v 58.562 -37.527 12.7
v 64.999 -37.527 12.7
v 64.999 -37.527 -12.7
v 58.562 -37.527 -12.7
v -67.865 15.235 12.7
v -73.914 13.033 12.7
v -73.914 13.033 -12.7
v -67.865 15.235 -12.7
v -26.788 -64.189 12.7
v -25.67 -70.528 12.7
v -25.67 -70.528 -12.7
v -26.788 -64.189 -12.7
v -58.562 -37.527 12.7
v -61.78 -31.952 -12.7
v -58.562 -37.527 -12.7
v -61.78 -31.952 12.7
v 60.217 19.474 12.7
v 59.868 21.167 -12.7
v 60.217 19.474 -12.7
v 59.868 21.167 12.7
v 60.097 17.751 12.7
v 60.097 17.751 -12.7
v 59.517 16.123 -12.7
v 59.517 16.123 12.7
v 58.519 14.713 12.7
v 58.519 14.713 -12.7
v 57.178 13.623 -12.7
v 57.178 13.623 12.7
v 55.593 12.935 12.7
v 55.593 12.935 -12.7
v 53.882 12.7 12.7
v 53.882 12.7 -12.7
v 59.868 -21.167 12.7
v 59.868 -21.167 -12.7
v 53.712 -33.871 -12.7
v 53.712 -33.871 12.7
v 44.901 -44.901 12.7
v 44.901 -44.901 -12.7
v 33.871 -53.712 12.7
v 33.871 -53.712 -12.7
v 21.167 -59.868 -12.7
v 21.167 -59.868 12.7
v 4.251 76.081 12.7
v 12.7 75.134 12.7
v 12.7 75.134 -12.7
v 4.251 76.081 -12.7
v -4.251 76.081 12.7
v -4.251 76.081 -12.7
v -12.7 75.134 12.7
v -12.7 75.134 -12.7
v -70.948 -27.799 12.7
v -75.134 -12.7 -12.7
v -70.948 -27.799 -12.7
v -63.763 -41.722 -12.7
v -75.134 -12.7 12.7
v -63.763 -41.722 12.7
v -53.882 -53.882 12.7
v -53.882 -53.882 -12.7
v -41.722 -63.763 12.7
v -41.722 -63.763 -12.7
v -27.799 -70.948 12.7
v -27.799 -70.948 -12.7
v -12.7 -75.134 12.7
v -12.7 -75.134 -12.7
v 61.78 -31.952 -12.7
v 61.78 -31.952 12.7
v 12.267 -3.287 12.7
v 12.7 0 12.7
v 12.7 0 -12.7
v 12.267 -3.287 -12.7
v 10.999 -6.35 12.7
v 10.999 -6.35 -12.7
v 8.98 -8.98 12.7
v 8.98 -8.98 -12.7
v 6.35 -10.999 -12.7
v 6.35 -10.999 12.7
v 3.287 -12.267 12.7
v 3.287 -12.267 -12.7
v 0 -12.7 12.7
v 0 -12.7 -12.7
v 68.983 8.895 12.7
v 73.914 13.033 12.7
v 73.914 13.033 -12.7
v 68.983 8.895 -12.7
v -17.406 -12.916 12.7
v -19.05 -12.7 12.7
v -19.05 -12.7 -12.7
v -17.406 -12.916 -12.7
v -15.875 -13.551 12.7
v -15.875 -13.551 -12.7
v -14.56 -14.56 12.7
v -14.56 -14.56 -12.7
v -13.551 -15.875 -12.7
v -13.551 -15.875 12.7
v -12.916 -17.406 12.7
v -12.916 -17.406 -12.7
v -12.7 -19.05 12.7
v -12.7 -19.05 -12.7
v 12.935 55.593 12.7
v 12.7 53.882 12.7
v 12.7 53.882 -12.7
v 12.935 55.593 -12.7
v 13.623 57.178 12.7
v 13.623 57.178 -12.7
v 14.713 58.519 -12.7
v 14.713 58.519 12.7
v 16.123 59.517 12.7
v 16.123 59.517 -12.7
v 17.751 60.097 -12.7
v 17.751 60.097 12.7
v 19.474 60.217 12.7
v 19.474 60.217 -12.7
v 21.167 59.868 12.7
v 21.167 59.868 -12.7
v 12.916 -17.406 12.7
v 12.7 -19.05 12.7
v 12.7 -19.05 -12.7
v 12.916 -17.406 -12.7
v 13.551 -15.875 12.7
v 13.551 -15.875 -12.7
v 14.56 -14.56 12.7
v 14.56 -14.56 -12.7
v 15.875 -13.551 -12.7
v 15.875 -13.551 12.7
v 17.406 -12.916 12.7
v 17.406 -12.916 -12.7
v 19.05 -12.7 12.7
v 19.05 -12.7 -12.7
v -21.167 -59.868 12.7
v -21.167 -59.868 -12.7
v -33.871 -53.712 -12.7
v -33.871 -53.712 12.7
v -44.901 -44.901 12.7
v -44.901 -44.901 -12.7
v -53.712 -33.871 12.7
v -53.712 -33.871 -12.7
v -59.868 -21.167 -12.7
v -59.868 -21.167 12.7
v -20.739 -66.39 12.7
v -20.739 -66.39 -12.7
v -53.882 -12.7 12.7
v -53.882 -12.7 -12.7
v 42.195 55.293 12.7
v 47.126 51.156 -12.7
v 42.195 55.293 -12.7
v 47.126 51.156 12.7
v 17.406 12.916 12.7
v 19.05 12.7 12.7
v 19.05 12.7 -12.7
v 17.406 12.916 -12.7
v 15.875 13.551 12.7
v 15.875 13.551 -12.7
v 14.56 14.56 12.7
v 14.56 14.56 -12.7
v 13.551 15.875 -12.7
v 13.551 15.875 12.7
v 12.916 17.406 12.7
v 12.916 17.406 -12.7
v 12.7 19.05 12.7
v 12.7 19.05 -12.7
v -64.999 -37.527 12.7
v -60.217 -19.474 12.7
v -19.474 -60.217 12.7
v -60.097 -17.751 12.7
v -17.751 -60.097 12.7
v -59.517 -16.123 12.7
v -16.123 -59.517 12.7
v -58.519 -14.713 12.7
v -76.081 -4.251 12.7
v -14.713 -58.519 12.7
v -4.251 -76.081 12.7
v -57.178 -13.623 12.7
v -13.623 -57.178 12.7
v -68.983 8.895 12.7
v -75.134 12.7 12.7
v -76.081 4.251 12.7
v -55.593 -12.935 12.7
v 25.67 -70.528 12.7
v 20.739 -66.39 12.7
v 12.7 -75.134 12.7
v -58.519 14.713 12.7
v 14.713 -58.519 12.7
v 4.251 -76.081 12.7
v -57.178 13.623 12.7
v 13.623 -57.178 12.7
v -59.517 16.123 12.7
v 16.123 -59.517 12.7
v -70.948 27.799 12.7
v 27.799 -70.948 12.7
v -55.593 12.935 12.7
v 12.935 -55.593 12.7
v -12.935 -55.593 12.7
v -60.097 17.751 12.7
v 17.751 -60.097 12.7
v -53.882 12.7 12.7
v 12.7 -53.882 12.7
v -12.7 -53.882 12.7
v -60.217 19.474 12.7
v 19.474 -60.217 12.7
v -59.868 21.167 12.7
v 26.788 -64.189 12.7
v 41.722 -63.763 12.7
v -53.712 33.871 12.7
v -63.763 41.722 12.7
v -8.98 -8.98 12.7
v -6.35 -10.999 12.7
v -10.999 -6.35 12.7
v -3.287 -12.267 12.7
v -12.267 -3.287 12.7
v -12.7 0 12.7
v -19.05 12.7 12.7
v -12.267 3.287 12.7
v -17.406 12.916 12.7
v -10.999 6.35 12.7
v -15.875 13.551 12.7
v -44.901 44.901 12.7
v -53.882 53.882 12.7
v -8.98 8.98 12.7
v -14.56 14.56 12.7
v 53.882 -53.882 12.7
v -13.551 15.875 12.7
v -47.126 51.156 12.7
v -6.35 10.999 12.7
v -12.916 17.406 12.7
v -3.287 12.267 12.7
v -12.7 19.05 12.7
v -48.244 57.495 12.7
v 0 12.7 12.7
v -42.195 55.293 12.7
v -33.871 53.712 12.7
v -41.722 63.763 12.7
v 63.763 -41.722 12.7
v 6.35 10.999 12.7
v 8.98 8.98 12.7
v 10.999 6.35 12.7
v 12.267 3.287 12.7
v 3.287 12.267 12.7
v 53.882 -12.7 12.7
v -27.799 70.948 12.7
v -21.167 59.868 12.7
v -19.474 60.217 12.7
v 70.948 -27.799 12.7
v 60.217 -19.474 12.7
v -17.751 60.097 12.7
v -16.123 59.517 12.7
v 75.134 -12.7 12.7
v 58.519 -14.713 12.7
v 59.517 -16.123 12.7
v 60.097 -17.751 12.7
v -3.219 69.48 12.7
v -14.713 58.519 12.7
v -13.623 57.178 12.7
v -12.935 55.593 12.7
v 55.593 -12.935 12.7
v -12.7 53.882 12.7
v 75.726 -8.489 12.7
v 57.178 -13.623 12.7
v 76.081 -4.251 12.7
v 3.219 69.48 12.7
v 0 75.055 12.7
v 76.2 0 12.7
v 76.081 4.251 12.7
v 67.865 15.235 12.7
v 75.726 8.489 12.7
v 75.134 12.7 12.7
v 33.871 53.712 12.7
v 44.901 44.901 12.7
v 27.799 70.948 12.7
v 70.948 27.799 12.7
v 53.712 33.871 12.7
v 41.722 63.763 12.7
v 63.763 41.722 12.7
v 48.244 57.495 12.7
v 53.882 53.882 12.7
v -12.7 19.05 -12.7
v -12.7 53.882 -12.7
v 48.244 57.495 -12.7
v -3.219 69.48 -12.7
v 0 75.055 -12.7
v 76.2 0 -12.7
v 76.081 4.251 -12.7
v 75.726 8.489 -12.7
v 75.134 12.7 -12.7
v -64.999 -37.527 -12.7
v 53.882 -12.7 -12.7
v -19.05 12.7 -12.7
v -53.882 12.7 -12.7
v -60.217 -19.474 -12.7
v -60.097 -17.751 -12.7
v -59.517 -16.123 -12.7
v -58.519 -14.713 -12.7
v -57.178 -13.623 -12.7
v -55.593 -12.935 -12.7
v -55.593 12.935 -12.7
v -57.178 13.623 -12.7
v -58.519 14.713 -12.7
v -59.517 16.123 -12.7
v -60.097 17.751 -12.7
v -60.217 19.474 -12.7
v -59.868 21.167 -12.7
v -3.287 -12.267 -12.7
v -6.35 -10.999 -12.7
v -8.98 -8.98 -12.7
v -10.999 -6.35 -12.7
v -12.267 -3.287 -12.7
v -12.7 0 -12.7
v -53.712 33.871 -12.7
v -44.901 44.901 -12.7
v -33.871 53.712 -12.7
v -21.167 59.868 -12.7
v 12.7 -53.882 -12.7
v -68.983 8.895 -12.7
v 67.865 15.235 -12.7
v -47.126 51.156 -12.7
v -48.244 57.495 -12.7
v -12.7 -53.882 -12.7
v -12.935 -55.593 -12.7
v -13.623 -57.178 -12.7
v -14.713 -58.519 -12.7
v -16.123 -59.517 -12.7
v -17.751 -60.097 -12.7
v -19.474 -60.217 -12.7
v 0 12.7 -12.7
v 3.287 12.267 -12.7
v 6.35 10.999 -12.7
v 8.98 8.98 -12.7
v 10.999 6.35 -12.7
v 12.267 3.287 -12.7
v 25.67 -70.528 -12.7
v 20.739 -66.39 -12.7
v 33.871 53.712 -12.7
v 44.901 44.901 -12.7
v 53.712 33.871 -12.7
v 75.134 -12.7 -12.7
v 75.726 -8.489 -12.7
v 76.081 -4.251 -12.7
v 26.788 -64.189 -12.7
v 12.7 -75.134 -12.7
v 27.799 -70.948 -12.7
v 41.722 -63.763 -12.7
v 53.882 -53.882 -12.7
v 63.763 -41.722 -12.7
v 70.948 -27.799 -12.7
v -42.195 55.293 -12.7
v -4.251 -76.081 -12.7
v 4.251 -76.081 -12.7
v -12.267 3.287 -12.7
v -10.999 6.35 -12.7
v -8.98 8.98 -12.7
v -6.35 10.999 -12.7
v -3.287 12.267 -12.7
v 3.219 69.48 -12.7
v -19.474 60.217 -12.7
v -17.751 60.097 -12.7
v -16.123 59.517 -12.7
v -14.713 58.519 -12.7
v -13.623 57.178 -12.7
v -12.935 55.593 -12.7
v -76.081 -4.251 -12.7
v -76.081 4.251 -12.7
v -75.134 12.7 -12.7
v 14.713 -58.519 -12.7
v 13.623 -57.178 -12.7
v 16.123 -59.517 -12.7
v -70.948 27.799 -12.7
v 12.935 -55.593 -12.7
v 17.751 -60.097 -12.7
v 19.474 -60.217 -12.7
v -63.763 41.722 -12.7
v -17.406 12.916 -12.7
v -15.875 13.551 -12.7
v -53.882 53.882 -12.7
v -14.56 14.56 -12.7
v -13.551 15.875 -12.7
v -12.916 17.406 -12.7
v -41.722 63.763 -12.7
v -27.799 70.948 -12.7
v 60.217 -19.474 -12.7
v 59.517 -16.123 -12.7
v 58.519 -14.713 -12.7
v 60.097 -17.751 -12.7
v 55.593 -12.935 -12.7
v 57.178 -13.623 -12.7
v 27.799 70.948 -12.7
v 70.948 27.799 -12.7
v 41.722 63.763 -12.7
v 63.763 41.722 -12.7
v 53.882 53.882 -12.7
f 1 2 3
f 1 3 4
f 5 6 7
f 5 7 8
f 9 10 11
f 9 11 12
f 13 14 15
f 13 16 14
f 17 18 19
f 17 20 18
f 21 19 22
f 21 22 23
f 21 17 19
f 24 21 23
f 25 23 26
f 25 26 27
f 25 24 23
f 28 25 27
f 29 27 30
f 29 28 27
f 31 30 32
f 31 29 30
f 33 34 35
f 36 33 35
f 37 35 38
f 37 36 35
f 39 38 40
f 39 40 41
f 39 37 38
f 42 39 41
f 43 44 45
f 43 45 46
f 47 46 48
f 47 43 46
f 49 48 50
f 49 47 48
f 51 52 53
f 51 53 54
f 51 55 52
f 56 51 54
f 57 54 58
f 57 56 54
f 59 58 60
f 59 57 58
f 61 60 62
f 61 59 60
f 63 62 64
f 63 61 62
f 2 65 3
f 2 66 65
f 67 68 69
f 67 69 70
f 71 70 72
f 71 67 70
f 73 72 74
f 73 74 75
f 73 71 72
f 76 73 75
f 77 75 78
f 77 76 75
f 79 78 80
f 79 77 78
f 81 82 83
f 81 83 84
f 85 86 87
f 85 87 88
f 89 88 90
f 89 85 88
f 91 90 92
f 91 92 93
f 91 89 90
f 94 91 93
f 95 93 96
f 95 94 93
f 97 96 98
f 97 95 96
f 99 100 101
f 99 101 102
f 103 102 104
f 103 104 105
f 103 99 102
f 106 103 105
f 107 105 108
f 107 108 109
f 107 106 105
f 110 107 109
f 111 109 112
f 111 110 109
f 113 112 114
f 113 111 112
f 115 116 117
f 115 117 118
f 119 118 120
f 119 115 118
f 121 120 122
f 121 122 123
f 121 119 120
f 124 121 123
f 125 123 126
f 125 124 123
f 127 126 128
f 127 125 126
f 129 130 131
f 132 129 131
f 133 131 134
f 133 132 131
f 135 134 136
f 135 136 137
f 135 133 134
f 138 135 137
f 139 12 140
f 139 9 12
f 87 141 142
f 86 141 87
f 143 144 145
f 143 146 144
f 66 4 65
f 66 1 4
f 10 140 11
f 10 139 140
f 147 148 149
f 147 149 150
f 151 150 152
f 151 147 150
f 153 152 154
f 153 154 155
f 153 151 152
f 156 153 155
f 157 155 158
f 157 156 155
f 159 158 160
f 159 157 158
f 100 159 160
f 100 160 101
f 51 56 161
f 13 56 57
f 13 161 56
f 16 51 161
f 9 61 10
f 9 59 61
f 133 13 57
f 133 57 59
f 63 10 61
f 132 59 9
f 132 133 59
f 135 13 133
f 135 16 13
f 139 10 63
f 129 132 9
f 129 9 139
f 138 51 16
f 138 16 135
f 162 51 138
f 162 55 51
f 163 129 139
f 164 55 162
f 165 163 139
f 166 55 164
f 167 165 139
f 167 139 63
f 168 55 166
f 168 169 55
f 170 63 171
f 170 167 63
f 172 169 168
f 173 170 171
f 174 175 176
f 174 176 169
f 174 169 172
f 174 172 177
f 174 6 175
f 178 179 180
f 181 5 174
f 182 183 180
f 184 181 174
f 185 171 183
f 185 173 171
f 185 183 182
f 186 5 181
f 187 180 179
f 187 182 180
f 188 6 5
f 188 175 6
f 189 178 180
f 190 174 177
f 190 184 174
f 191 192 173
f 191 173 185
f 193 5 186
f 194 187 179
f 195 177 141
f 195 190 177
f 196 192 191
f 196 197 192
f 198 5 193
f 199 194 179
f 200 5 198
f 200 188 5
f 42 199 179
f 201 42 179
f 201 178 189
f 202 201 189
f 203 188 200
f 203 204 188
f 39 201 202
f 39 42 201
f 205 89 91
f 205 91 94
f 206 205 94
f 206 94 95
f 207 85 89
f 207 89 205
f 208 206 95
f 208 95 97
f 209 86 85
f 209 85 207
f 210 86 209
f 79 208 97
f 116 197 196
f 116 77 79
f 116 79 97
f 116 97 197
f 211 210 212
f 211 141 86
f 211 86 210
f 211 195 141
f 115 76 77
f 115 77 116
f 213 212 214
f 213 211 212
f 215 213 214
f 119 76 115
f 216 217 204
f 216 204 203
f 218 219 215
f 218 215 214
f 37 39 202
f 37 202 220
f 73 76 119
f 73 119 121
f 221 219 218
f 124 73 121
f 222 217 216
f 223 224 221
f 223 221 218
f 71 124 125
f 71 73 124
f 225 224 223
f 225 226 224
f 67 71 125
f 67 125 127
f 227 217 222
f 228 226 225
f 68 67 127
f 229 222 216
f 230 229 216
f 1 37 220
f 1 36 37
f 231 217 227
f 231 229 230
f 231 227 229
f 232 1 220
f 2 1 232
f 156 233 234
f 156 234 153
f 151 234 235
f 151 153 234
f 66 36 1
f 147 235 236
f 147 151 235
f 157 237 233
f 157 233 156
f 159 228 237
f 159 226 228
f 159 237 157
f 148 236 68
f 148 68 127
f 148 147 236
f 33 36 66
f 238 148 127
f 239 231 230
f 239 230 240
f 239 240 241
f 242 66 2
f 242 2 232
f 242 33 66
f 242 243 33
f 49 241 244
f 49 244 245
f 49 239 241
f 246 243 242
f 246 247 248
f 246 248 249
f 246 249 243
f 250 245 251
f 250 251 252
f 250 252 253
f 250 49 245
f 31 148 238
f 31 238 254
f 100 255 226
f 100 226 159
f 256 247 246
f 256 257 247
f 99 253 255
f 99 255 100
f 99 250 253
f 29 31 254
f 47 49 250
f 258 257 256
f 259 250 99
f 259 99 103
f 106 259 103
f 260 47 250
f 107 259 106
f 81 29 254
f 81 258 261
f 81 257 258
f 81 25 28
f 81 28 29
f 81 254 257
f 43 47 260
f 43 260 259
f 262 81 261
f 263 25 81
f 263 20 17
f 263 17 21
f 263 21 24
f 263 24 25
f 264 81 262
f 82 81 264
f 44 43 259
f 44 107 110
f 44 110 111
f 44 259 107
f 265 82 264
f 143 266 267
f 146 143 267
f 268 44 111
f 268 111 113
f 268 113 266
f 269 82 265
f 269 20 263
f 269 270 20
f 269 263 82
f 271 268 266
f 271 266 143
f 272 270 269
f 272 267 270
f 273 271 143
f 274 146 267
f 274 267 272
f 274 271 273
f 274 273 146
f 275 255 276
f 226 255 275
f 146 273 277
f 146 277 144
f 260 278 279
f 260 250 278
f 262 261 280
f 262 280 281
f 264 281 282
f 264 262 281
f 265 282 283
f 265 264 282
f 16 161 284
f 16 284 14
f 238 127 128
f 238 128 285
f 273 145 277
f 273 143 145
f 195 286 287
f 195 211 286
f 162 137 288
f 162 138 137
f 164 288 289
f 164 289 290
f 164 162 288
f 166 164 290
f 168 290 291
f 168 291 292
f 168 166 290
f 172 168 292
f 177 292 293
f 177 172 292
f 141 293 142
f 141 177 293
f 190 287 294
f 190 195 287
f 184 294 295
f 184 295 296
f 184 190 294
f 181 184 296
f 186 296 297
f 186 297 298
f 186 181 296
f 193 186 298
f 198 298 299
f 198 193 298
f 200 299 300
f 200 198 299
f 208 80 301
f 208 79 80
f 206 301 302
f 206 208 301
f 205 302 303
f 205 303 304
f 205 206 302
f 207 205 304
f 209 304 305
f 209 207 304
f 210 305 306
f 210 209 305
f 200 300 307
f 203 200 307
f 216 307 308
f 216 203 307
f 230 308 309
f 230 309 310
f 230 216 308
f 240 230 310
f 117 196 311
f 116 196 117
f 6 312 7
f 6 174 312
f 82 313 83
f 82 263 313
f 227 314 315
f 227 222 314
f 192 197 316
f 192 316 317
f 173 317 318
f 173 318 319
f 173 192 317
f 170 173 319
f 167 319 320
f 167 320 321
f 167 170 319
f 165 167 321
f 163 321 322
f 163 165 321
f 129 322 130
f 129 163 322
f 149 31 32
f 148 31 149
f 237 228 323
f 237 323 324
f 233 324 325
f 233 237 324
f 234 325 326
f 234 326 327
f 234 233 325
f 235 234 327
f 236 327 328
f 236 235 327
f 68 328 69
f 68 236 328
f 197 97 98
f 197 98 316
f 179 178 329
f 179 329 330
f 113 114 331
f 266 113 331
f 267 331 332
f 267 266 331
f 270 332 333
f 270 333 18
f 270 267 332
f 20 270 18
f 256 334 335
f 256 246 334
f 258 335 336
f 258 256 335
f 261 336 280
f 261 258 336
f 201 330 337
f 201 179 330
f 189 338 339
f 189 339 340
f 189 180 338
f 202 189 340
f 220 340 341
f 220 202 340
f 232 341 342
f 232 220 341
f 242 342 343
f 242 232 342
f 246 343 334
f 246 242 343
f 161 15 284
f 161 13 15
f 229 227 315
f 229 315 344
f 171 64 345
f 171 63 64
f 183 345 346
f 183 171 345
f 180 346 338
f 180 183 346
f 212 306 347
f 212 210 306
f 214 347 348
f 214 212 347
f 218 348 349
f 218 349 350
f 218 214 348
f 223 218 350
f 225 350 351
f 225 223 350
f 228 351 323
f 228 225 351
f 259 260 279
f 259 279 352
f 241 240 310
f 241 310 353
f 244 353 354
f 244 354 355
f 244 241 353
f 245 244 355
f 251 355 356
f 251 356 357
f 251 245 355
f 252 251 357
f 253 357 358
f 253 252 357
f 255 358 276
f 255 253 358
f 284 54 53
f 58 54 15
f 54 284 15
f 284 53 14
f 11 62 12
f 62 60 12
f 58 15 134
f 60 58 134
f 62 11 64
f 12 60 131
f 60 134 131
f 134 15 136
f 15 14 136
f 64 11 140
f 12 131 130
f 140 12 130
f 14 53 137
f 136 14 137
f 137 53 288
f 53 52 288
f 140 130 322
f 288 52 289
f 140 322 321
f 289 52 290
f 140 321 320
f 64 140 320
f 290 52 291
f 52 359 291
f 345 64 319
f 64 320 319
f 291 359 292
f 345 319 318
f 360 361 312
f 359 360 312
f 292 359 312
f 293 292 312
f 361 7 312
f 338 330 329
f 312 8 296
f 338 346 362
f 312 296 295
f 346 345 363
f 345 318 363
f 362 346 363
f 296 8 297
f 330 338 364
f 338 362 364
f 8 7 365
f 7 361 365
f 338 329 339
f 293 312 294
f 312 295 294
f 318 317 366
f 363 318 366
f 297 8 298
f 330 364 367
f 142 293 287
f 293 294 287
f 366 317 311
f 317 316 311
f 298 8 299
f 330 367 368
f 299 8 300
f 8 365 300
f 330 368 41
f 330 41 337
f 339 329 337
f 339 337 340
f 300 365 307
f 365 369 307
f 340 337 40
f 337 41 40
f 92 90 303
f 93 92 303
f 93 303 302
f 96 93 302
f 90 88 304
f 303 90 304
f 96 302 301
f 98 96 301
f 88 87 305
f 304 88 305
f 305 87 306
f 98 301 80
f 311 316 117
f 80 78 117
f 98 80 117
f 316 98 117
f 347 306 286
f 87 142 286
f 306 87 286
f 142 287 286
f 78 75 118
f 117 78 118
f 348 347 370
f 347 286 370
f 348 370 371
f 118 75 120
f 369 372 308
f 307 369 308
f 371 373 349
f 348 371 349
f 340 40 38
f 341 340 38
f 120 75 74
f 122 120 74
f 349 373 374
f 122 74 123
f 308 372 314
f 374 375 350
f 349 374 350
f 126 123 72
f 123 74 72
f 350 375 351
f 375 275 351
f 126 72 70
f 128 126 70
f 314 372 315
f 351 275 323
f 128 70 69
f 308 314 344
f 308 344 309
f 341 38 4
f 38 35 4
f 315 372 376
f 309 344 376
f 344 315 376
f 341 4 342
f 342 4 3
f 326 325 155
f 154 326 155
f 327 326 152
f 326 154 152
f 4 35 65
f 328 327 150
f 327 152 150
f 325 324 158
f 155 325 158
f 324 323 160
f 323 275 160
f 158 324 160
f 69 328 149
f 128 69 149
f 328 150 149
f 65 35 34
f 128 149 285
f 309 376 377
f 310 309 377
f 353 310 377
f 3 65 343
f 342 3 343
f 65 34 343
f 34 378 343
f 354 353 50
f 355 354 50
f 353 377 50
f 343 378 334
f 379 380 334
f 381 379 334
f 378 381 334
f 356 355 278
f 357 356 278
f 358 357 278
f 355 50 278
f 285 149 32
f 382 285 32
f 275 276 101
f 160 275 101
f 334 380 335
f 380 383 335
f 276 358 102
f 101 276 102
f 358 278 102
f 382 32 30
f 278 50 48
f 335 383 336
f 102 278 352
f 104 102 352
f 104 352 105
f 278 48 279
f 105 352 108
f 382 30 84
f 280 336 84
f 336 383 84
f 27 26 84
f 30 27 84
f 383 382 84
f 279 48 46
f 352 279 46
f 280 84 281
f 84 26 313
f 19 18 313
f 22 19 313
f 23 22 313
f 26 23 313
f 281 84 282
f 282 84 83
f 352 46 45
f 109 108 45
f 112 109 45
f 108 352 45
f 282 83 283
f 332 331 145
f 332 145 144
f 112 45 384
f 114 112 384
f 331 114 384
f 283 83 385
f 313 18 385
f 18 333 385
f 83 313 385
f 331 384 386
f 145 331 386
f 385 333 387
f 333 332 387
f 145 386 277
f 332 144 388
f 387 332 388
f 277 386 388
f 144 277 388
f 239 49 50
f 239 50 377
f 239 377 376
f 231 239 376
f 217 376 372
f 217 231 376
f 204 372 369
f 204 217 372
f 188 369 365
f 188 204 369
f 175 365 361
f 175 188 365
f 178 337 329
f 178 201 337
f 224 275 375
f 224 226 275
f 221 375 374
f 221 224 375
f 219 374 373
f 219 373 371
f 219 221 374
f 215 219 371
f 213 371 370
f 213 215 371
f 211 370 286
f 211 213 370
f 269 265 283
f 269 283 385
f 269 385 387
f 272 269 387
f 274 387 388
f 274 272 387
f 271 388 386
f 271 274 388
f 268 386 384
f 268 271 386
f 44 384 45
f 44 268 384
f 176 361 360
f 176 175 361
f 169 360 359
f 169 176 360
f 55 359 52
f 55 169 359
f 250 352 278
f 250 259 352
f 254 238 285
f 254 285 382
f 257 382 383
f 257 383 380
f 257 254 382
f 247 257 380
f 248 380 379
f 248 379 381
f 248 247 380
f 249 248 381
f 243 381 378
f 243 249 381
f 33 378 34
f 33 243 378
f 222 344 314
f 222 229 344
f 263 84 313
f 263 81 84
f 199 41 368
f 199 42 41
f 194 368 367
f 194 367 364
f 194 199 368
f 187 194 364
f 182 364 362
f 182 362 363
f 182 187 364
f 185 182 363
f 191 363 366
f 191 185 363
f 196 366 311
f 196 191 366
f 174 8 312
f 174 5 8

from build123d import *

# Parameters (mm, degrees)
F1_DEPTH = 12.7


with BuildPart() as f1:
    # F0 (on Top) → F1 (new body, symmetric)
    with BuildSketch(Plane.XY):
        with BuildLine():
            ThreePointArc((75.134213, -12.7), (75.933086, -6.372321), (76.2, 0))
            ThreePointArc((76.2, 0), (75.933086, 6.372321), (75.134213, 12.7))
            ThreePointArc((75.134213, 12.7), (53.881537, 53.881537), (12.7, 75.134213))
            ThreePointArc((12.7, 75.134213), (0, 76.2), (-12.7, 75.134213))
            ThreePointArc((-12.7, 75.134213), (-53.881537, 53.881537), (-75.134213, 12.7))
            ThreePointArc((-75.134213, 12.7), (-76.2, 0), (-75.134213, -12.7))
            ThreePointArc((-75.134213, -12.7), (-53.881537, -53.881537), (-12.7, -75.134213))
            ThreePointArc((-12.7, -75.134213), (0, -76.2), (12.7, -75.134213))
            ThreePointArc((12.7, -75.134213), (53.881537, -53.881537), (75.134213, -12.7))
        make_face()
        Polygon((-25.670162, -70.528192), (-26.787991, -64.18867), (-20.73889, -66.390362), align=None, mode=Mode.SUBTRACT)
        Polygon((-64.999133, -37.527267), (-61.780473, -31.952385), (-58.561814, -37.527267), align=None, mode=Mode.SUBTRACT)
        with BuildLine():
            Line((-34.771706, -12.7), (-19.05, -12.7))
            ThreePointArc((-19.05, -12.7), (-14.559872, -14.559872), (-12.7, -19.05))
            Line((-12.7, -19.05), (-12.7, -34.771706))
            Line((-12.7, -34.771706), (-12.7, -45.838683))
            Line((-12.7, -45.838683), (-12.7, -53.881537))
            ThreePointArc((-12.7, -53.881537), (-15.383826, -59.06629), (-21.166667, -59.868374))
            ThreePointArc((-21.166667, -59.868374), (-44.901281, -44.901281), (-59.868374, -21.166667))
            ThreePointArc((-59.868374, -21.166667), (-59.06629, -15.383826), (-53.881537, -12.7))
            Line((-53.881537, -12.7), (-45.838683, -12.7))
            Line((-45.838683, -12.7), (-34.771706, -12.7))
        make_face(mode=Mode.SUBTRACT)
        Polygon((25.670162, -70.528192), (20.73889, -66.390362), (26.787991, -64.18867), align=None, mode=Mode.SUBTRACT)
        with BuildLine():
            ThreePointArc((12.7, -19.05), (14.559872, -14.559872), (19.05, -12.7))
            Line((19.05, -12.7), (34.771706, -12.7))
            Line((34.771706, -12.7), (45.838683, -12.7))
            Line((45.838683, -12.7), (53.881537, -12.7))
            ThreePointArc((53.881537, -12.7), (59.06629, -15.383826), (59.868374, -21.166667))
            ThreePointArc((59.868374, -21.166667), (44.901281, -44.901281), (21.166667, -59.868374))
            ThreePointArc((21.166667, -59.868374), (15.383826, -59.06629), (12.7, -53.881537))
            Line((12.7, -53.881537), (12.7, -45.838683))
            Line((12.7, -45.838683), (12.7, -34.771706))
            Line((12.7, -34.771706), (12.7, -19.05))
        make_face(mode=Mode.SUBTRACT)
        Polygon((64.999133, -37.527267), (58.561814, -37.527267), (61.780473, -31.952385), align=None, mode=Mode.SUBTRACT)
        Polygon((-73.914287, 13.033083), (-67.865185, 15.234776), (-68.983014, 8.895254), align=None, mode=Mode.SUBTRACT)
        with BuildLine():
            ThreePointArc((-59.868374, 21.166667), (-44.901281, 44.901281), (-21.166667, 59.868374))
            ThreePointArc((-21.166667, 59.868374), (-15.383826, 59.06629), (-12.7, 53.881537))
            Line((-12.7, 53.881537), (-12.7, 45.838683))
            Line((-12.7, 45.838683), (-12.7, 34.771706))
            Line((-12.7, 34.771706), (-12.7, 19.05))
            ThreePointArc((-12.7, 19.05), (-14.559872, 14.559872), (-19.05, 12.7))
            Line((-19.05, 12.7), (-34.771706, 12.7))
            Line((-34.771706, 12.7), (-45.838683, 12.7))
            Line((-45.838683, 12.7), (-53.881537, 12.7))
            ThreePointArc((-53.881537, 12.7), (-59.06629, 15.383826), (-59.868374, 21.166667))
        make_face(mode=Mode.SUBTRACT)
        Polygon((-48.244124, 57.495109), (-42.195023, 55.293416), (-47.126296, 51.155587), align=None, mode=Mode.SUBTRACT)
        with BuildLine():
            ThreePointArc((0, 12.7), (8.980256, 8.980256), (12.7, 0))
            ThreePointArc((12.7, 0), (8.980256, -8.980256), (0, -12.7))
            ThreePointArc((0, -12.7), (-8.980256, -8.980256), (-12.7, 0))
            ThreePointArc((-12.7, 0), (-8.980256, 8.980256), (0, 12.7))
        make_face(mode=Mode.SUBTRACT)
        with BuildLine():
            ThreePointArc((19.05, 12.7), (14.559872, 14.559872), (12.7, 19.05))
            Line((12.7, 19.05), (12.7, 34.771706))
            Line((12.7, 34.771706), (12.7, 45.838683))
            Line((12.7, 45.838683), (12.7, 53.881537))
            ThreePointArc((12.7, 53.881537), (15.383826, 59.06629), (21.166667, 59.868374))
            ThreePointArc((21.166667, 59.868374), (44.901281, 44.901281), (59.868374, 21.166667))
            ThreePointArc((59.868374, 21.166667), (59.06629, 15.383826), (53.881537, 12.7))
            Line((53.881537, 12.7), (45.838683, 12.7))
            Line((45.838683, 12.7), (34.771706, 12.7))
            Line((34.771706, 12.7), (19.05, 12.7))
        make_face(mode=Mode.SUBTRACT)
        Polygon((73.914287, 13.033083), (68.983014, 8.895254), (67.865185, 15.234776), align=None, mode=Mode.SUBTRACT)
        Polygon((0, 75.054534), (3.21866, 69.479652), (-3.21866, 69.479652), align=None, mode=Mode.SUBTRACT)
        Polygon((48.244124, 57.495109), (47.126296, 51.155587), (42.195023, 55.293416), align=None, mode=Mode.SUBTRACT)
    extrude(amount=F1_DEPTH, both=True)


solid = f1.part
